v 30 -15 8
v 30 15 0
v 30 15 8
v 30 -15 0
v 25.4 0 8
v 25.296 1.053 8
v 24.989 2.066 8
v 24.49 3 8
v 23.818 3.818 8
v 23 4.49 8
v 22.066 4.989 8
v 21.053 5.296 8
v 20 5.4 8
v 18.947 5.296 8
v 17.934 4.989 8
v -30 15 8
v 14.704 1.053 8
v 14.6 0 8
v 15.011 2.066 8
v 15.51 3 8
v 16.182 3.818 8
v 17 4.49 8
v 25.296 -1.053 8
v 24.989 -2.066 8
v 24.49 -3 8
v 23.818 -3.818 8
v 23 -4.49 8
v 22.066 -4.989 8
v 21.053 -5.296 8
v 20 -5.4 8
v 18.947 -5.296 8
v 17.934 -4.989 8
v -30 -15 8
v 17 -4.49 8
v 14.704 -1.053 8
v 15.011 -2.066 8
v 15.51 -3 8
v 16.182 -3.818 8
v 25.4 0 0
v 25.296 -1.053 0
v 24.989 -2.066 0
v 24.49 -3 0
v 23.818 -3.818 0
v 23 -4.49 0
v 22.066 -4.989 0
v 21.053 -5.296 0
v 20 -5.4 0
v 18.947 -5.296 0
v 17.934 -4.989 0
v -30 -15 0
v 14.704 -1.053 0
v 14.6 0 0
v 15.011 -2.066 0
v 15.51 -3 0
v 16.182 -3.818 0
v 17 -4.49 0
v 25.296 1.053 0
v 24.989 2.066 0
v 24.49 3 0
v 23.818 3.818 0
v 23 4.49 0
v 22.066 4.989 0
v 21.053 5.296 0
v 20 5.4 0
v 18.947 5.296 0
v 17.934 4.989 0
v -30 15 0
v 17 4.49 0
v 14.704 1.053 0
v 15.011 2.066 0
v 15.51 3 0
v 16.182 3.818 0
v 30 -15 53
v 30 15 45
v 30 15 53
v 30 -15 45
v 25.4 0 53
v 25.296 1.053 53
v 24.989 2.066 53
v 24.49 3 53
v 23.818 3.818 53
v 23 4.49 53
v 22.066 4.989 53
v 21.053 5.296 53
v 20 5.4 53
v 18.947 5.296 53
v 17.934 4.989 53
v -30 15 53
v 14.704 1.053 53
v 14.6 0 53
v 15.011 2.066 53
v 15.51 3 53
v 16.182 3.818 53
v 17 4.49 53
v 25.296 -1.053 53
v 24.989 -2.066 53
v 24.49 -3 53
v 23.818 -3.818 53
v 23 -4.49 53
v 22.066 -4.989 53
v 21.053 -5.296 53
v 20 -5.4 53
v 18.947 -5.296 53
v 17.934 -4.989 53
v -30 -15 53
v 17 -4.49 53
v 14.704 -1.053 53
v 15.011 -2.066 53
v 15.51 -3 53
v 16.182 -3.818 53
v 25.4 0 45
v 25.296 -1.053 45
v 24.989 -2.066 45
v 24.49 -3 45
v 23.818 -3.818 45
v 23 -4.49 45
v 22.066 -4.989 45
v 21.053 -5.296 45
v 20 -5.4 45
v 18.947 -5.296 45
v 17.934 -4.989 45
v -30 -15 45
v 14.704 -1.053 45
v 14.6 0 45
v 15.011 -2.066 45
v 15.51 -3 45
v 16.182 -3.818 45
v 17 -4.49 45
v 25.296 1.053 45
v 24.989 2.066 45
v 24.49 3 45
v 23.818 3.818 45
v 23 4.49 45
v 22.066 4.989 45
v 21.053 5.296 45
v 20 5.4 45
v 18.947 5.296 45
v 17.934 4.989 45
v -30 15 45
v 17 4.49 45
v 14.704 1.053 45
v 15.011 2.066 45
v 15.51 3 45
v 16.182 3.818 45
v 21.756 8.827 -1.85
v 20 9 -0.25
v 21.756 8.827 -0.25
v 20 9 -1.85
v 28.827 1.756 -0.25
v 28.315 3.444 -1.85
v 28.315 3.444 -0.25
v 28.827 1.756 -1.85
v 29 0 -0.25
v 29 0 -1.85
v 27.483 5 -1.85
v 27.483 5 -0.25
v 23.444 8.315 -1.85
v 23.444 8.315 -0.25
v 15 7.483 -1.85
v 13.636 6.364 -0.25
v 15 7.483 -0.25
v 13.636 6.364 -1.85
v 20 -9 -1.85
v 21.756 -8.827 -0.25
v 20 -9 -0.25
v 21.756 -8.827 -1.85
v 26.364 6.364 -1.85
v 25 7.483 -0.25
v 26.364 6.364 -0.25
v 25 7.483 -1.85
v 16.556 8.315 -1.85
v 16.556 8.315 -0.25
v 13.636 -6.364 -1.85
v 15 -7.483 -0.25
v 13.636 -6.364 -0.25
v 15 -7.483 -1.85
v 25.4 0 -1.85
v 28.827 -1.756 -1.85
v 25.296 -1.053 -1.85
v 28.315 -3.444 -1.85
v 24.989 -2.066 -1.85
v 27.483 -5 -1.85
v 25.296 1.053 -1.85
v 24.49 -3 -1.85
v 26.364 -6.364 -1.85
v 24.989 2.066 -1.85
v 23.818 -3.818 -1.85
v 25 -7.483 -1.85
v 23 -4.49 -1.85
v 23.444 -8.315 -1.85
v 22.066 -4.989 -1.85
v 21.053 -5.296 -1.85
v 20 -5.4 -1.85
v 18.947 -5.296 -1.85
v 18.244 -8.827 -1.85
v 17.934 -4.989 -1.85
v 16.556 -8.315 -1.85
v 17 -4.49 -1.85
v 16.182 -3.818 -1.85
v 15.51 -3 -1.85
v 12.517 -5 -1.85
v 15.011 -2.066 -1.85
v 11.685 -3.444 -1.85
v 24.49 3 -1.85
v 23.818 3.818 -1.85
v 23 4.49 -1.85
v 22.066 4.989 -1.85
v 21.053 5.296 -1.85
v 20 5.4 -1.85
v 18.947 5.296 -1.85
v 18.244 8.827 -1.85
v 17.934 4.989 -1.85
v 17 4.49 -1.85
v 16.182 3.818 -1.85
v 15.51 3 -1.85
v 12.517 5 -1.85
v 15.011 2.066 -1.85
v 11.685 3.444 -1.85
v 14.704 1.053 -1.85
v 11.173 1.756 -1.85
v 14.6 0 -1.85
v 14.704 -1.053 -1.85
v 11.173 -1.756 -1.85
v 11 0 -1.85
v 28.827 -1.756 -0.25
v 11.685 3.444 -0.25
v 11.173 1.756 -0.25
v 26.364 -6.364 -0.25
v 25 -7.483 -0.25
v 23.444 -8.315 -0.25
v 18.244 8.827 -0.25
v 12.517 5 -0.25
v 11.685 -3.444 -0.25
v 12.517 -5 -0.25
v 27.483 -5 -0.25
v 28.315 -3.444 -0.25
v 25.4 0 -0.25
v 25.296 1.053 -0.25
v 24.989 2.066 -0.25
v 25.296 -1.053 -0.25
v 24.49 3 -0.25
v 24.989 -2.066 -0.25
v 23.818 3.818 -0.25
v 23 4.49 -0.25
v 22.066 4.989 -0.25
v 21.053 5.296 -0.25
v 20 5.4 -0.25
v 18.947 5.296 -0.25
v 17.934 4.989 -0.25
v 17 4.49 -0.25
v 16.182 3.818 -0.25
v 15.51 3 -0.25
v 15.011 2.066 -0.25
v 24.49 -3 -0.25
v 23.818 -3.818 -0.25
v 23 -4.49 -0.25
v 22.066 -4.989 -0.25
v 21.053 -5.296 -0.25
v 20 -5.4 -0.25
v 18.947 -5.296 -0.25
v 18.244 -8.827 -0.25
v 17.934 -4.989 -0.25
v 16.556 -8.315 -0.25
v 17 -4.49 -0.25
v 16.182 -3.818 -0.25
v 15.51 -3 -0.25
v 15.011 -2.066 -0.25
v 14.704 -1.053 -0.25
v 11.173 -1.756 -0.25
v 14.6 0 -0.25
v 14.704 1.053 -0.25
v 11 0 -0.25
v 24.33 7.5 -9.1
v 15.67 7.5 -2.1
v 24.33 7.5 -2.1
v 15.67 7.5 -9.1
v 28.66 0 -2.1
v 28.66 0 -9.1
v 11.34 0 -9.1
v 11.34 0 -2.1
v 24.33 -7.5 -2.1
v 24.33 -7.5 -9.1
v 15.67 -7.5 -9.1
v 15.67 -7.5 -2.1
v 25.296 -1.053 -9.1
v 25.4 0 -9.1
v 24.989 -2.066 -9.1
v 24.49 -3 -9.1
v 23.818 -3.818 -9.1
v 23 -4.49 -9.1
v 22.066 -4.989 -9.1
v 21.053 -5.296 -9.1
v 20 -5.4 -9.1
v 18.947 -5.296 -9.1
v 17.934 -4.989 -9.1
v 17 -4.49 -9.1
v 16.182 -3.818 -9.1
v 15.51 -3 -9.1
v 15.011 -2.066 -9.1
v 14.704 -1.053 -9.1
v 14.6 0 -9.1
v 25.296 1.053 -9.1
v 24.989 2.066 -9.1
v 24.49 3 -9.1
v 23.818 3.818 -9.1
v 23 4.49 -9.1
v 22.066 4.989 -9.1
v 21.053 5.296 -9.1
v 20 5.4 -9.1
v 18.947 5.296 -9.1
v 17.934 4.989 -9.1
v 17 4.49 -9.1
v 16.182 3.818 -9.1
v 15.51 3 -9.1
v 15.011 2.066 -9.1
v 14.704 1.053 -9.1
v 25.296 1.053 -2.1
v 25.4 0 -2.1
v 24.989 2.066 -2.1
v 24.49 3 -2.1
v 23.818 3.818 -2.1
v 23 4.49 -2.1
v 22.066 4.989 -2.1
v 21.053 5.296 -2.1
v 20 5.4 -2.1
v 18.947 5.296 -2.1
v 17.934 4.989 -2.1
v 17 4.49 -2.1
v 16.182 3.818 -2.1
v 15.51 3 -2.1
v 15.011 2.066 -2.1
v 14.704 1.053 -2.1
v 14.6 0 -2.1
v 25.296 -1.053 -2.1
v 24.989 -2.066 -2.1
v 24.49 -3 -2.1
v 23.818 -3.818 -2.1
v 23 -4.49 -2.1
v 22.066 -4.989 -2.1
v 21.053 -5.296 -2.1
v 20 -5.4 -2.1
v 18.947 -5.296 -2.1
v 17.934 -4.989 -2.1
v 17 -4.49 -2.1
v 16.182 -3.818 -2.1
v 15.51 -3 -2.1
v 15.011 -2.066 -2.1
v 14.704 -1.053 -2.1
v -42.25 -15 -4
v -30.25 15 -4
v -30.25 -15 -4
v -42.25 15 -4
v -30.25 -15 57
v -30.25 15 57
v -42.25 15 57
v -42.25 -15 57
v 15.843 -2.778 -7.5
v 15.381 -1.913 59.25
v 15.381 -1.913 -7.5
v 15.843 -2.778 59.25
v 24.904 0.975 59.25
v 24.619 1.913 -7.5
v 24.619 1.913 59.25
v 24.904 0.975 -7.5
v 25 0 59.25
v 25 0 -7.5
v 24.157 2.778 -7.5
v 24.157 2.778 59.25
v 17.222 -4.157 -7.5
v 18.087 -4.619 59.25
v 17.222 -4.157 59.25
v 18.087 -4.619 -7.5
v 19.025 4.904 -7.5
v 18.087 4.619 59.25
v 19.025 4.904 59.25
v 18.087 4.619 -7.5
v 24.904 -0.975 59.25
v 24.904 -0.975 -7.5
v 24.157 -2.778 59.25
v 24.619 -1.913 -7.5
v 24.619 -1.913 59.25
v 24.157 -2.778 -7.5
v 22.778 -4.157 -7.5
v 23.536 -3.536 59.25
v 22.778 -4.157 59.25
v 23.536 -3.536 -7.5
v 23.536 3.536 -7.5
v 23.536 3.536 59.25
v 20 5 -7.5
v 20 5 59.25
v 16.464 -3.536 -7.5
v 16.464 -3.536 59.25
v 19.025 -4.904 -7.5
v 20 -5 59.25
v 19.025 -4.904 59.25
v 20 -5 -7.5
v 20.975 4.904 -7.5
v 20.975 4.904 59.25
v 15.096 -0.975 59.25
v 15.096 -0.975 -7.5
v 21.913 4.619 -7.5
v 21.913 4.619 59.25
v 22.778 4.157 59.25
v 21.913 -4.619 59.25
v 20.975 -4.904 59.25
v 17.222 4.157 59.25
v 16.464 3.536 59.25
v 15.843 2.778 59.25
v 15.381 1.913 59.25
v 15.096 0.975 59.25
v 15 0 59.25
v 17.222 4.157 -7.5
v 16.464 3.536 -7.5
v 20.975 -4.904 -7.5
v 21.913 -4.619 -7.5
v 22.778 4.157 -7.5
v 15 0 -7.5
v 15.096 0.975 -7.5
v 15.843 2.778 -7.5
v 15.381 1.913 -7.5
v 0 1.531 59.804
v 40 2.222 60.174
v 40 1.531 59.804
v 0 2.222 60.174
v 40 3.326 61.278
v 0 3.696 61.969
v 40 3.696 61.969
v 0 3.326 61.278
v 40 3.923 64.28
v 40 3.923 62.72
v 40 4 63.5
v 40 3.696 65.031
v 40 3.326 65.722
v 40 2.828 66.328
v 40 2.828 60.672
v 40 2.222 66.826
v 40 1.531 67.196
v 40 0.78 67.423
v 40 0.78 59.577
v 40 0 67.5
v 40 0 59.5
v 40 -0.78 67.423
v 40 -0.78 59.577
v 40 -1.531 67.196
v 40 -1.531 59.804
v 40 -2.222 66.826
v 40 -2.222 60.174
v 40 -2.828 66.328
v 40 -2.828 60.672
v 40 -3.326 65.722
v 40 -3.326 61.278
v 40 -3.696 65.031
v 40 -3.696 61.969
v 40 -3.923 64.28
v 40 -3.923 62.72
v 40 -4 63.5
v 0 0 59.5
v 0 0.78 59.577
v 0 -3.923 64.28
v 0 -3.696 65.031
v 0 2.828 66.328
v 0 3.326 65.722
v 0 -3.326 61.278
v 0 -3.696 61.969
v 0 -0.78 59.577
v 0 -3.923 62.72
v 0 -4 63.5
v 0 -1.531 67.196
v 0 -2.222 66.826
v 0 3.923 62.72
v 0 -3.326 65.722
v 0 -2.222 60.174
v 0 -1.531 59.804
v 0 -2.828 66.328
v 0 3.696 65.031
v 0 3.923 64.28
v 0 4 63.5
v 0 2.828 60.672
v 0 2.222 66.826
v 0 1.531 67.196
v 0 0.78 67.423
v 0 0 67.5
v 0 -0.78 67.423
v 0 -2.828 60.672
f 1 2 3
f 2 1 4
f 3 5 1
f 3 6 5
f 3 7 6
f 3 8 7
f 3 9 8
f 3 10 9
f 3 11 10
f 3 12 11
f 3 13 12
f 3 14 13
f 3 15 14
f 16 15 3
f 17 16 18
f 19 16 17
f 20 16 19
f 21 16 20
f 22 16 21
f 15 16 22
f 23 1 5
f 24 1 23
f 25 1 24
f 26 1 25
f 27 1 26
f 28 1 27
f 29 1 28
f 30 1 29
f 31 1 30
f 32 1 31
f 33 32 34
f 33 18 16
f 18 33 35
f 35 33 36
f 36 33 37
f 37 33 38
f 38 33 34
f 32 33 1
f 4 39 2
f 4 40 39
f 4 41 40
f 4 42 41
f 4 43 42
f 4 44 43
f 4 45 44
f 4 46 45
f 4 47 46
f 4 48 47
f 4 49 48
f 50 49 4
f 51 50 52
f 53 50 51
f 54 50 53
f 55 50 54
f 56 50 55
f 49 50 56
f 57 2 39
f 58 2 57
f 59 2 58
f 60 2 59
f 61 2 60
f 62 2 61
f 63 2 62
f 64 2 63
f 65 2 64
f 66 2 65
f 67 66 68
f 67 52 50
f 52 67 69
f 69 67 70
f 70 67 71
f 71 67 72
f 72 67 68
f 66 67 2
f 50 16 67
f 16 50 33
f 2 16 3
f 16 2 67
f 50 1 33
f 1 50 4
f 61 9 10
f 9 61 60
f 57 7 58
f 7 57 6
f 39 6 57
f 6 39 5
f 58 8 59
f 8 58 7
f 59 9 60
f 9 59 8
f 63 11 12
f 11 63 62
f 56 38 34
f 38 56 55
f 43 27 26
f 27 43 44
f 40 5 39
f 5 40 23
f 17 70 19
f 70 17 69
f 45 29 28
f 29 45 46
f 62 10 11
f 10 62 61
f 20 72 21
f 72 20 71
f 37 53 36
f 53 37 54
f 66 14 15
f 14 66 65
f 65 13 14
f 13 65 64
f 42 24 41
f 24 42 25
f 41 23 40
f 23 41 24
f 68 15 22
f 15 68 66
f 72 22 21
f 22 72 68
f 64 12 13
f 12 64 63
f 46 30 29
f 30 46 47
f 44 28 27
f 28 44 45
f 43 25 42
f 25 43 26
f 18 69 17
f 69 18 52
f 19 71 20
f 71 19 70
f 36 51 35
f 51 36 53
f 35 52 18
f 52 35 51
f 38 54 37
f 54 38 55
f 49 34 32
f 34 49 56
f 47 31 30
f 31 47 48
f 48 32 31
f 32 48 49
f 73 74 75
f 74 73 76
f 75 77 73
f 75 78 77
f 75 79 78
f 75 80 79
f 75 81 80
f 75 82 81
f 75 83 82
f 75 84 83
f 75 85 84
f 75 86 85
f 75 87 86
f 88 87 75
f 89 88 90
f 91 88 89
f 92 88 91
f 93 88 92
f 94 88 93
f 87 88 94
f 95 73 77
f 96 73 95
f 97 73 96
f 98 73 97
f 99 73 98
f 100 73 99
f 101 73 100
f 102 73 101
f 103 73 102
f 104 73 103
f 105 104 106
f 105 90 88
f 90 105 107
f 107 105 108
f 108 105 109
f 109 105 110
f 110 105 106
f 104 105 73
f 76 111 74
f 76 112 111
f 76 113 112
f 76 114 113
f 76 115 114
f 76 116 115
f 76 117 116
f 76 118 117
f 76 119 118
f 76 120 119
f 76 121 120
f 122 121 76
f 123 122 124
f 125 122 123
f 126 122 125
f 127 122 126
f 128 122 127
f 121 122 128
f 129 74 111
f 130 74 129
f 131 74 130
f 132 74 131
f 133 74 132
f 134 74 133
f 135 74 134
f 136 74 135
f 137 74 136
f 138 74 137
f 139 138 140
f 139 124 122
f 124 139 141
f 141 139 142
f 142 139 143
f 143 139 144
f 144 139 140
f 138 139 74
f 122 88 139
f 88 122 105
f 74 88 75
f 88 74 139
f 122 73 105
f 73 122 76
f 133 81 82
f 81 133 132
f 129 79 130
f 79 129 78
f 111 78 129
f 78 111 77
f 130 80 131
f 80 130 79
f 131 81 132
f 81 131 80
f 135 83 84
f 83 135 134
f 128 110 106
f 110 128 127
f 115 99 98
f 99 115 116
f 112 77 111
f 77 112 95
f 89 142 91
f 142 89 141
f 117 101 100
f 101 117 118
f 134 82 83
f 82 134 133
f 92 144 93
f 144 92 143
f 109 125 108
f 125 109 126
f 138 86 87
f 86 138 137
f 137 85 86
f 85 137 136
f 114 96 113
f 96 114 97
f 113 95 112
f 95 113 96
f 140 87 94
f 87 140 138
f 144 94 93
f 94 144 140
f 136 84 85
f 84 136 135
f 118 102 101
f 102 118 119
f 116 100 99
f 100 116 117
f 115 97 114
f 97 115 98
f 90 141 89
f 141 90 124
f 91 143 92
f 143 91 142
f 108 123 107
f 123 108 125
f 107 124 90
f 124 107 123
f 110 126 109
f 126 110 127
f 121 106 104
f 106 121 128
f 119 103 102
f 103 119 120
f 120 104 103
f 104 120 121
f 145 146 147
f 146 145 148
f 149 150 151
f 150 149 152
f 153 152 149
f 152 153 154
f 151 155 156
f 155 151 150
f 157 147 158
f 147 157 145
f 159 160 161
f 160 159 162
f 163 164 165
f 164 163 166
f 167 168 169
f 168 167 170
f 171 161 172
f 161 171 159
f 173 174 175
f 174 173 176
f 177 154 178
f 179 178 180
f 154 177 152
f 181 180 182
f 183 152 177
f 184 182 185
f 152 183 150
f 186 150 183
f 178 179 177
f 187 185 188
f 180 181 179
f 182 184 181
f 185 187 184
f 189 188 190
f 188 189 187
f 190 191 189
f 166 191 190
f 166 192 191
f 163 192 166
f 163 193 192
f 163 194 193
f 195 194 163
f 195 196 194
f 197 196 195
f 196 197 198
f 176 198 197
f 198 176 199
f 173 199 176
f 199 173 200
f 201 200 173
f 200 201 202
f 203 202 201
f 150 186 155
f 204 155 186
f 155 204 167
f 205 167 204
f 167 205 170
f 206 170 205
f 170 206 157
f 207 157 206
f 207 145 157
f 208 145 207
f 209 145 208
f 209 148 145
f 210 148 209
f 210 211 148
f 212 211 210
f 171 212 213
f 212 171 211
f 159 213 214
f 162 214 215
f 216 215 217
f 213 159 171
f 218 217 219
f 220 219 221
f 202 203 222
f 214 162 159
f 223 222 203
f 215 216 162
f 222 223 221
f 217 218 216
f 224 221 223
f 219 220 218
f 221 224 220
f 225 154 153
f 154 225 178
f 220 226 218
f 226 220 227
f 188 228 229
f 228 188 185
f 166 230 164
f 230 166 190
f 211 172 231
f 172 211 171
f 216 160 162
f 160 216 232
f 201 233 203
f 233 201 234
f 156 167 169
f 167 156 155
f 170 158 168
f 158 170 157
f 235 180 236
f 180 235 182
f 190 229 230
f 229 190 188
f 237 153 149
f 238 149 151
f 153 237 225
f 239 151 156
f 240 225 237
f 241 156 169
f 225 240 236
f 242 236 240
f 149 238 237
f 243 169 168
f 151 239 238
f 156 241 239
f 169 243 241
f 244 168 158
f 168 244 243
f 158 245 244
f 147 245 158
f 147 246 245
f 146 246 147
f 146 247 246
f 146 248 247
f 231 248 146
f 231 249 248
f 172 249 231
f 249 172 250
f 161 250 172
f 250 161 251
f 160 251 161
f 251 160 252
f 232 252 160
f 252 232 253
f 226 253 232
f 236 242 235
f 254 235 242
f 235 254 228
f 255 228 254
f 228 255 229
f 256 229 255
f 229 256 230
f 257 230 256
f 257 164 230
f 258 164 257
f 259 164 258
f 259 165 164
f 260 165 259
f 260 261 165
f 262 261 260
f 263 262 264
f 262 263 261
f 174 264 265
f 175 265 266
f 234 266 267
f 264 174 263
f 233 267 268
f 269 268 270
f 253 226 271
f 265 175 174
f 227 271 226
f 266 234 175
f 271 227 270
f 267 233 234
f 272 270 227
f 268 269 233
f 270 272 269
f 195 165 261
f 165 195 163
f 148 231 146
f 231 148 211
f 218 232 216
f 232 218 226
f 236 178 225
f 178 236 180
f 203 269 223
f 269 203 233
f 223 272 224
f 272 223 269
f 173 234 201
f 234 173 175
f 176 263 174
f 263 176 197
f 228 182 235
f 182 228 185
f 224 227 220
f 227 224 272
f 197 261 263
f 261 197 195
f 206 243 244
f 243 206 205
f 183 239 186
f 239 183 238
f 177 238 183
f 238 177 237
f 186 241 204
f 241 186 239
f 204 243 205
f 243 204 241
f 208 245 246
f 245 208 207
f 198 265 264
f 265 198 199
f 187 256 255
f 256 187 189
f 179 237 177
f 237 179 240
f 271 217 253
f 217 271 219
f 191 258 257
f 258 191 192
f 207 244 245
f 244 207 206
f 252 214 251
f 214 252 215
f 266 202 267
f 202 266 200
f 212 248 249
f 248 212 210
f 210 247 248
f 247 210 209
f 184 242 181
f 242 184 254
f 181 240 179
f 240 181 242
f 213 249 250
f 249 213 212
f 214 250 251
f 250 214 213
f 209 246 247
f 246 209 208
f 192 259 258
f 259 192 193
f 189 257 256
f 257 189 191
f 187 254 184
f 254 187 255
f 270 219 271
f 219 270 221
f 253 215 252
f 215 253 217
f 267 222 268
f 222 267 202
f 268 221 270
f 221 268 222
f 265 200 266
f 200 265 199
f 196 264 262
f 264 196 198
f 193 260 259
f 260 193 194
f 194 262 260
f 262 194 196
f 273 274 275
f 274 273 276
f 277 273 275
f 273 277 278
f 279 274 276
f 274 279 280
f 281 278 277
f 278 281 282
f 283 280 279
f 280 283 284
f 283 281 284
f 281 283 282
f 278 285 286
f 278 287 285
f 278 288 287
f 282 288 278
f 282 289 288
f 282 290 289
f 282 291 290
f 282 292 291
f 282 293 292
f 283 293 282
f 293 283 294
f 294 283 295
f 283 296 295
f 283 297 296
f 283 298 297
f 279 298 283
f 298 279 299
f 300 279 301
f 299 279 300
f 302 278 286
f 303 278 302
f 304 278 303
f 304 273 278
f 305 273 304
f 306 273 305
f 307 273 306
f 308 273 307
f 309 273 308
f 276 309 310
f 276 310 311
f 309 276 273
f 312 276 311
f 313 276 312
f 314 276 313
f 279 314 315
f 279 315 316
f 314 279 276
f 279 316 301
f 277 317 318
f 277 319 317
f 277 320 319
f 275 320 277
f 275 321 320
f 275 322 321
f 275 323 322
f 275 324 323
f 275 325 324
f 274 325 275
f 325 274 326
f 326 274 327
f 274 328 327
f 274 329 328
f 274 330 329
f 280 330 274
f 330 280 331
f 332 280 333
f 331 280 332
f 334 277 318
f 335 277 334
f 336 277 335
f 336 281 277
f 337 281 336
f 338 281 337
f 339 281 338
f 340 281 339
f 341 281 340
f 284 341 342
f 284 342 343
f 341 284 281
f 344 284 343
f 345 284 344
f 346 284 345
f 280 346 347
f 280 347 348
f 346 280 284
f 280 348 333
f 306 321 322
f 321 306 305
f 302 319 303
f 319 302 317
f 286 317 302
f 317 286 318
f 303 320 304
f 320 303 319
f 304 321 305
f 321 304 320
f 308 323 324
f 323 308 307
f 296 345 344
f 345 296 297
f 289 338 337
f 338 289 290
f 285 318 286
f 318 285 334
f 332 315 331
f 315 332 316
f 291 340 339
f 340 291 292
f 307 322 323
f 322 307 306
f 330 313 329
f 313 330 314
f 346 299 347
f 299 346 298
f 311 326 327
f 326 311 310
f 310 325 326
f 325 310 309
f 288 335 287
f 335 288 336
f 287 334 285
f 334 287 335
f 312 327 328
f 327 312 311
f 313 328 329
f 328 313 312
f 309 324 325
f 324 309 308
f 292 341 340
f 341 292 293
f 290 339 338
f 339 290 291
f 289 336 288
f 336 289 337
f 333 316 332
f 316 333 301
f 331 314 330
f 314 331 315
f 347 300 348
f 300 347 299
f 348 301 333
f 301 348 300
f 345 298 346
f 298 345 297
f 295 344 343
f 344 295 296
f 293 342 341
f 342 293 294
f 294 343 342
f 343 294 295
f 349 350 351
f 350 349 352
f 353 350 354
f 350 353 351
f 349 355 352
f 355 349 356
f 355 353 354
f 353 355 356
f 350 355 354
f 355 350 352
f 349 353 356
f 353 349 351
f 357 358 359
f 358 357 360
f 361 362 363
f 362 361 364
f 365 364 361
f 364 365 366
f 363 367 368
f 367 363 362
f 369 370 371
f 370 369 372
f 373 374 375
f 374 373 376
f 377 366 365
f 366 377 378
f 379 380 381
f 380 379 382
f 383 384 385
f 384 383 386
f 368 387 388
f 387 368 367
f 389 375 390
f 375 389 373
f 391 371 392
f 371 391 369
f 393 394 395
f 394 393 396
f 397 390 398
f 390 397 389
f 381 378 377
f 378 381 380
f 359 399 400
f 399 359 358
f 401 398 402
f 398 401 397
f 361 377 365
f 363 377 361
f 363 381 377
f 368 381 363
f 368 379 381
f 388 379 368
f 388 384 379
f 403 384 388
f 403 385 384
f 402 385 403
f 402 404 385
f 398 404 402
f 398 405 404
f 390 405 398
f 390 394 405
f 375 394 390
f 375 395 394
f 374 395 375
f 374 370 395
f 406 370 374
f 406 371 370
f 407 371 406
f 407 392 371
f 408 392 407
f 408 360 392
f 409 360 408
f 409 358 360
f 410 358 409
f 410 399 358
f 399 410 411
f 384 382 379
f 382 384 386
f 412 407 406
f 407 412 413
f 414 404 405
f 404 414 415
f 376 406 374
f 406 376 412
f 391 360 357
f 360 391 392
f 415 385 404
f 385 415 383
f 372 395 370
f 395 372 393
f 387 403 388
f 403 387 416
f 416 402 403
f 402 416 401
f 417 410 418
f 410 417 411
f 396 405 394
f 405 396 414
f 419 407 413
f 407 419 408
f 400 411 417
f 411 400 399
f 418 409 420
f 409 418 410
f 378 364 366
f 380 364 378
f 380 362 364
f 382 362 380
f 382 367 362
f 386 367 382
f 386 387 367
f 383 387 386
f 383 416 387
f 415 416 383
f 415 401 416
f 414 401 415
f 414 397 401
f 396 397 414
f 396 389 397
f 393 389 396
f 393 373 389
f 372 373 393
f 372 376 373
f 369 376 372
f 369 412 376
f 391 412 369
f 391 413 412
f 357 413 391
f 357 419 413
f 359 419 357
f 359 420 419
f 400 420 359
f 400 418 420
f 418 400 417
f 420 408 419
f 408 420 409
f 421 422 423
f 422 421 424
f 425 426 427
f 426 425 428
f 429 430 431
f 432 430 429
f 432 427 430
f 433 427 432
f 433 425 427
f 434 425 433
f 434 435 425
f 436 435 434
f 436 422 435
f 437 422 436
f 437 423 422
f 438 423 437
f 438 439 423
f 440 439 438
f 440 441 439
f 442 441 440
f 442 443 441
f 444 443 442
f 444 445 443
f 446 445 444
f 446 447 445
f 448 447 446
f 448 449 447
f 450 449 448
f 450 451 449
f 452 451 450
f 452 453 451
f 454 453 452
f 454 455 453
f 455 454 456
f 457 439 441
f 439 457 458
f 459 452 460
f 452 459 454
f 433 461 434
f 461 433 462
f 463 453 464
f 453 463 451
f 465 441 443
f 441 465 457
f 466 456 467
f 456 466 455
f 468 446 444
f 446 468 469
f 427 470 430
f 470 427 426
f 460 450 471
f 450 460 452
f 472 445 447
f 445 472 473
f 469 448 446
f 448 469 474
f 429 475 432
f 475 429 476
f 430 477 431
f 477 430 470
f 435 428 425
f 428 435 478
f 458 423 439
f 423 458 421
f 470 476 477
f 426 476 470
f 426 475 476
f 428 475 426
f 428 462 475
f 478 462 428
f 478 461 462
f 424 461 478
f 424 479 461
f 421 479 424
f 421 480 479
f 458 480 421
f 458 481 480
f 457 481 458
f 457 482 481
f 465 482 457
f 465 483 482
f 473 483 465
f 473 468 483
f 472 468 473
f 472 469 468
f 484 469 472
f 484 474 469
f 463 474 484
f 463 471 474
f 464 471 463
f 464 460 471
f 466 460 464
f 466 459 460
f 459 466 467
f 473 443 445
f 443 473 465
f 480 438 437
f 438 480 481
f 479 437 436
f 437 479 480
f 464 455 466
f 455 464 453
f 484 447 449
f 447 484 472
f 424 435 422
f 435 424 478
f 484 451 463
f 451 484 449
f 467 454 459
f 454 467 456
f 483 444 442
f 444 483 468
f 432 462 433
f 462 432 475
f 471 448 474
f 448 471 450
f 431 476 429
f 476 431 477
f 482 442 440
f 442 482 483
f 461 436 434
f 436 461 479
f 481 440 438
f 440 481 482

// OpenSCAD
$fn = 32;

// ------------------------------------------------------------------------
// C clamp: throat 45 mm, screw d10
// Every part is its own module, assembly() places every instance.
// ------------------------------------------------------------------------

// --- part 1 ---
module clamp_arm() {
  difference() {
    translate([-30, -15, 0]) cube([60, 30, 8]);
    translate([20, 0, -1]) cylinder(h = 10, d = 10.8);
  }
}

// --- part 2 ---
module clamp_spine() {
  difference() {
    translate([-30.5, -15, 0]) cube([61, 30, 12]);
  }
}

// --- part 3 ---
module clamp_screw() {
  translate([0, 0, -33.375]) cylinder(h = 66.75, d = 10);
}

// --- part 4 ---
module clamp_washer() {
  difference() {
      translate([0, 0, 0]) cylinder(h = 1.6, d = 18);
      translate([0, 0, -1]) cylinder(h = 3.6, d = 10.8);
    }
}

// --- part 5 ---
module clamp_nut() {
  difference() {
    linear_extrude(height = 7) polygon(points = [[8.66, 0], [4.33, 7.5], [-4.33, 7.5], [-8.66, 0], [-4.33, -7.5], [4.33, -7.5]]);
    translate([0, 0, -1]) cylinder(h = 9, d = 10.8);
  }
}

// --- part 6 ---
module tommy_bar() {
  translate([0, 0, -20]) cylinder(h = 40, d = 8);
}

// --- assembly ---
module assembly() {
  color([0.80, 0.24, 0.20]) translate([0, 0, 0]) rotate([0, 0, 0]) clamp_arm();
  color([0.20, 0.45, 0.75]) translate([0, 0, 45]) rotate([0, 0, 0]) clamp_arm();
  color([0.25, 0.62, 0.32]) translate([-42.25, 0, 26.5]) rotate([0, 90, 0]) clamp_spine();
  color([0.92, 0.70, 0.18]) translate([20, 0, 25.875]) rotate([0, 0, 0]) clamp_screw();
  color([0.58, 0.35, 0.70]) translate([20, 0, -1.85]) rotate([0, 0, 0]) clamp_washer();
  color([0.16, 0.66, 0.66]) translate([20, 0, -9.1]) rotate([0, 0, 0]) clamp_nut();
  color([0.85, 0.48, 0.18]) translate([20, 0, 63.5]) rotate([0, 90, 0]) tommy_bar();
}

assembly();
